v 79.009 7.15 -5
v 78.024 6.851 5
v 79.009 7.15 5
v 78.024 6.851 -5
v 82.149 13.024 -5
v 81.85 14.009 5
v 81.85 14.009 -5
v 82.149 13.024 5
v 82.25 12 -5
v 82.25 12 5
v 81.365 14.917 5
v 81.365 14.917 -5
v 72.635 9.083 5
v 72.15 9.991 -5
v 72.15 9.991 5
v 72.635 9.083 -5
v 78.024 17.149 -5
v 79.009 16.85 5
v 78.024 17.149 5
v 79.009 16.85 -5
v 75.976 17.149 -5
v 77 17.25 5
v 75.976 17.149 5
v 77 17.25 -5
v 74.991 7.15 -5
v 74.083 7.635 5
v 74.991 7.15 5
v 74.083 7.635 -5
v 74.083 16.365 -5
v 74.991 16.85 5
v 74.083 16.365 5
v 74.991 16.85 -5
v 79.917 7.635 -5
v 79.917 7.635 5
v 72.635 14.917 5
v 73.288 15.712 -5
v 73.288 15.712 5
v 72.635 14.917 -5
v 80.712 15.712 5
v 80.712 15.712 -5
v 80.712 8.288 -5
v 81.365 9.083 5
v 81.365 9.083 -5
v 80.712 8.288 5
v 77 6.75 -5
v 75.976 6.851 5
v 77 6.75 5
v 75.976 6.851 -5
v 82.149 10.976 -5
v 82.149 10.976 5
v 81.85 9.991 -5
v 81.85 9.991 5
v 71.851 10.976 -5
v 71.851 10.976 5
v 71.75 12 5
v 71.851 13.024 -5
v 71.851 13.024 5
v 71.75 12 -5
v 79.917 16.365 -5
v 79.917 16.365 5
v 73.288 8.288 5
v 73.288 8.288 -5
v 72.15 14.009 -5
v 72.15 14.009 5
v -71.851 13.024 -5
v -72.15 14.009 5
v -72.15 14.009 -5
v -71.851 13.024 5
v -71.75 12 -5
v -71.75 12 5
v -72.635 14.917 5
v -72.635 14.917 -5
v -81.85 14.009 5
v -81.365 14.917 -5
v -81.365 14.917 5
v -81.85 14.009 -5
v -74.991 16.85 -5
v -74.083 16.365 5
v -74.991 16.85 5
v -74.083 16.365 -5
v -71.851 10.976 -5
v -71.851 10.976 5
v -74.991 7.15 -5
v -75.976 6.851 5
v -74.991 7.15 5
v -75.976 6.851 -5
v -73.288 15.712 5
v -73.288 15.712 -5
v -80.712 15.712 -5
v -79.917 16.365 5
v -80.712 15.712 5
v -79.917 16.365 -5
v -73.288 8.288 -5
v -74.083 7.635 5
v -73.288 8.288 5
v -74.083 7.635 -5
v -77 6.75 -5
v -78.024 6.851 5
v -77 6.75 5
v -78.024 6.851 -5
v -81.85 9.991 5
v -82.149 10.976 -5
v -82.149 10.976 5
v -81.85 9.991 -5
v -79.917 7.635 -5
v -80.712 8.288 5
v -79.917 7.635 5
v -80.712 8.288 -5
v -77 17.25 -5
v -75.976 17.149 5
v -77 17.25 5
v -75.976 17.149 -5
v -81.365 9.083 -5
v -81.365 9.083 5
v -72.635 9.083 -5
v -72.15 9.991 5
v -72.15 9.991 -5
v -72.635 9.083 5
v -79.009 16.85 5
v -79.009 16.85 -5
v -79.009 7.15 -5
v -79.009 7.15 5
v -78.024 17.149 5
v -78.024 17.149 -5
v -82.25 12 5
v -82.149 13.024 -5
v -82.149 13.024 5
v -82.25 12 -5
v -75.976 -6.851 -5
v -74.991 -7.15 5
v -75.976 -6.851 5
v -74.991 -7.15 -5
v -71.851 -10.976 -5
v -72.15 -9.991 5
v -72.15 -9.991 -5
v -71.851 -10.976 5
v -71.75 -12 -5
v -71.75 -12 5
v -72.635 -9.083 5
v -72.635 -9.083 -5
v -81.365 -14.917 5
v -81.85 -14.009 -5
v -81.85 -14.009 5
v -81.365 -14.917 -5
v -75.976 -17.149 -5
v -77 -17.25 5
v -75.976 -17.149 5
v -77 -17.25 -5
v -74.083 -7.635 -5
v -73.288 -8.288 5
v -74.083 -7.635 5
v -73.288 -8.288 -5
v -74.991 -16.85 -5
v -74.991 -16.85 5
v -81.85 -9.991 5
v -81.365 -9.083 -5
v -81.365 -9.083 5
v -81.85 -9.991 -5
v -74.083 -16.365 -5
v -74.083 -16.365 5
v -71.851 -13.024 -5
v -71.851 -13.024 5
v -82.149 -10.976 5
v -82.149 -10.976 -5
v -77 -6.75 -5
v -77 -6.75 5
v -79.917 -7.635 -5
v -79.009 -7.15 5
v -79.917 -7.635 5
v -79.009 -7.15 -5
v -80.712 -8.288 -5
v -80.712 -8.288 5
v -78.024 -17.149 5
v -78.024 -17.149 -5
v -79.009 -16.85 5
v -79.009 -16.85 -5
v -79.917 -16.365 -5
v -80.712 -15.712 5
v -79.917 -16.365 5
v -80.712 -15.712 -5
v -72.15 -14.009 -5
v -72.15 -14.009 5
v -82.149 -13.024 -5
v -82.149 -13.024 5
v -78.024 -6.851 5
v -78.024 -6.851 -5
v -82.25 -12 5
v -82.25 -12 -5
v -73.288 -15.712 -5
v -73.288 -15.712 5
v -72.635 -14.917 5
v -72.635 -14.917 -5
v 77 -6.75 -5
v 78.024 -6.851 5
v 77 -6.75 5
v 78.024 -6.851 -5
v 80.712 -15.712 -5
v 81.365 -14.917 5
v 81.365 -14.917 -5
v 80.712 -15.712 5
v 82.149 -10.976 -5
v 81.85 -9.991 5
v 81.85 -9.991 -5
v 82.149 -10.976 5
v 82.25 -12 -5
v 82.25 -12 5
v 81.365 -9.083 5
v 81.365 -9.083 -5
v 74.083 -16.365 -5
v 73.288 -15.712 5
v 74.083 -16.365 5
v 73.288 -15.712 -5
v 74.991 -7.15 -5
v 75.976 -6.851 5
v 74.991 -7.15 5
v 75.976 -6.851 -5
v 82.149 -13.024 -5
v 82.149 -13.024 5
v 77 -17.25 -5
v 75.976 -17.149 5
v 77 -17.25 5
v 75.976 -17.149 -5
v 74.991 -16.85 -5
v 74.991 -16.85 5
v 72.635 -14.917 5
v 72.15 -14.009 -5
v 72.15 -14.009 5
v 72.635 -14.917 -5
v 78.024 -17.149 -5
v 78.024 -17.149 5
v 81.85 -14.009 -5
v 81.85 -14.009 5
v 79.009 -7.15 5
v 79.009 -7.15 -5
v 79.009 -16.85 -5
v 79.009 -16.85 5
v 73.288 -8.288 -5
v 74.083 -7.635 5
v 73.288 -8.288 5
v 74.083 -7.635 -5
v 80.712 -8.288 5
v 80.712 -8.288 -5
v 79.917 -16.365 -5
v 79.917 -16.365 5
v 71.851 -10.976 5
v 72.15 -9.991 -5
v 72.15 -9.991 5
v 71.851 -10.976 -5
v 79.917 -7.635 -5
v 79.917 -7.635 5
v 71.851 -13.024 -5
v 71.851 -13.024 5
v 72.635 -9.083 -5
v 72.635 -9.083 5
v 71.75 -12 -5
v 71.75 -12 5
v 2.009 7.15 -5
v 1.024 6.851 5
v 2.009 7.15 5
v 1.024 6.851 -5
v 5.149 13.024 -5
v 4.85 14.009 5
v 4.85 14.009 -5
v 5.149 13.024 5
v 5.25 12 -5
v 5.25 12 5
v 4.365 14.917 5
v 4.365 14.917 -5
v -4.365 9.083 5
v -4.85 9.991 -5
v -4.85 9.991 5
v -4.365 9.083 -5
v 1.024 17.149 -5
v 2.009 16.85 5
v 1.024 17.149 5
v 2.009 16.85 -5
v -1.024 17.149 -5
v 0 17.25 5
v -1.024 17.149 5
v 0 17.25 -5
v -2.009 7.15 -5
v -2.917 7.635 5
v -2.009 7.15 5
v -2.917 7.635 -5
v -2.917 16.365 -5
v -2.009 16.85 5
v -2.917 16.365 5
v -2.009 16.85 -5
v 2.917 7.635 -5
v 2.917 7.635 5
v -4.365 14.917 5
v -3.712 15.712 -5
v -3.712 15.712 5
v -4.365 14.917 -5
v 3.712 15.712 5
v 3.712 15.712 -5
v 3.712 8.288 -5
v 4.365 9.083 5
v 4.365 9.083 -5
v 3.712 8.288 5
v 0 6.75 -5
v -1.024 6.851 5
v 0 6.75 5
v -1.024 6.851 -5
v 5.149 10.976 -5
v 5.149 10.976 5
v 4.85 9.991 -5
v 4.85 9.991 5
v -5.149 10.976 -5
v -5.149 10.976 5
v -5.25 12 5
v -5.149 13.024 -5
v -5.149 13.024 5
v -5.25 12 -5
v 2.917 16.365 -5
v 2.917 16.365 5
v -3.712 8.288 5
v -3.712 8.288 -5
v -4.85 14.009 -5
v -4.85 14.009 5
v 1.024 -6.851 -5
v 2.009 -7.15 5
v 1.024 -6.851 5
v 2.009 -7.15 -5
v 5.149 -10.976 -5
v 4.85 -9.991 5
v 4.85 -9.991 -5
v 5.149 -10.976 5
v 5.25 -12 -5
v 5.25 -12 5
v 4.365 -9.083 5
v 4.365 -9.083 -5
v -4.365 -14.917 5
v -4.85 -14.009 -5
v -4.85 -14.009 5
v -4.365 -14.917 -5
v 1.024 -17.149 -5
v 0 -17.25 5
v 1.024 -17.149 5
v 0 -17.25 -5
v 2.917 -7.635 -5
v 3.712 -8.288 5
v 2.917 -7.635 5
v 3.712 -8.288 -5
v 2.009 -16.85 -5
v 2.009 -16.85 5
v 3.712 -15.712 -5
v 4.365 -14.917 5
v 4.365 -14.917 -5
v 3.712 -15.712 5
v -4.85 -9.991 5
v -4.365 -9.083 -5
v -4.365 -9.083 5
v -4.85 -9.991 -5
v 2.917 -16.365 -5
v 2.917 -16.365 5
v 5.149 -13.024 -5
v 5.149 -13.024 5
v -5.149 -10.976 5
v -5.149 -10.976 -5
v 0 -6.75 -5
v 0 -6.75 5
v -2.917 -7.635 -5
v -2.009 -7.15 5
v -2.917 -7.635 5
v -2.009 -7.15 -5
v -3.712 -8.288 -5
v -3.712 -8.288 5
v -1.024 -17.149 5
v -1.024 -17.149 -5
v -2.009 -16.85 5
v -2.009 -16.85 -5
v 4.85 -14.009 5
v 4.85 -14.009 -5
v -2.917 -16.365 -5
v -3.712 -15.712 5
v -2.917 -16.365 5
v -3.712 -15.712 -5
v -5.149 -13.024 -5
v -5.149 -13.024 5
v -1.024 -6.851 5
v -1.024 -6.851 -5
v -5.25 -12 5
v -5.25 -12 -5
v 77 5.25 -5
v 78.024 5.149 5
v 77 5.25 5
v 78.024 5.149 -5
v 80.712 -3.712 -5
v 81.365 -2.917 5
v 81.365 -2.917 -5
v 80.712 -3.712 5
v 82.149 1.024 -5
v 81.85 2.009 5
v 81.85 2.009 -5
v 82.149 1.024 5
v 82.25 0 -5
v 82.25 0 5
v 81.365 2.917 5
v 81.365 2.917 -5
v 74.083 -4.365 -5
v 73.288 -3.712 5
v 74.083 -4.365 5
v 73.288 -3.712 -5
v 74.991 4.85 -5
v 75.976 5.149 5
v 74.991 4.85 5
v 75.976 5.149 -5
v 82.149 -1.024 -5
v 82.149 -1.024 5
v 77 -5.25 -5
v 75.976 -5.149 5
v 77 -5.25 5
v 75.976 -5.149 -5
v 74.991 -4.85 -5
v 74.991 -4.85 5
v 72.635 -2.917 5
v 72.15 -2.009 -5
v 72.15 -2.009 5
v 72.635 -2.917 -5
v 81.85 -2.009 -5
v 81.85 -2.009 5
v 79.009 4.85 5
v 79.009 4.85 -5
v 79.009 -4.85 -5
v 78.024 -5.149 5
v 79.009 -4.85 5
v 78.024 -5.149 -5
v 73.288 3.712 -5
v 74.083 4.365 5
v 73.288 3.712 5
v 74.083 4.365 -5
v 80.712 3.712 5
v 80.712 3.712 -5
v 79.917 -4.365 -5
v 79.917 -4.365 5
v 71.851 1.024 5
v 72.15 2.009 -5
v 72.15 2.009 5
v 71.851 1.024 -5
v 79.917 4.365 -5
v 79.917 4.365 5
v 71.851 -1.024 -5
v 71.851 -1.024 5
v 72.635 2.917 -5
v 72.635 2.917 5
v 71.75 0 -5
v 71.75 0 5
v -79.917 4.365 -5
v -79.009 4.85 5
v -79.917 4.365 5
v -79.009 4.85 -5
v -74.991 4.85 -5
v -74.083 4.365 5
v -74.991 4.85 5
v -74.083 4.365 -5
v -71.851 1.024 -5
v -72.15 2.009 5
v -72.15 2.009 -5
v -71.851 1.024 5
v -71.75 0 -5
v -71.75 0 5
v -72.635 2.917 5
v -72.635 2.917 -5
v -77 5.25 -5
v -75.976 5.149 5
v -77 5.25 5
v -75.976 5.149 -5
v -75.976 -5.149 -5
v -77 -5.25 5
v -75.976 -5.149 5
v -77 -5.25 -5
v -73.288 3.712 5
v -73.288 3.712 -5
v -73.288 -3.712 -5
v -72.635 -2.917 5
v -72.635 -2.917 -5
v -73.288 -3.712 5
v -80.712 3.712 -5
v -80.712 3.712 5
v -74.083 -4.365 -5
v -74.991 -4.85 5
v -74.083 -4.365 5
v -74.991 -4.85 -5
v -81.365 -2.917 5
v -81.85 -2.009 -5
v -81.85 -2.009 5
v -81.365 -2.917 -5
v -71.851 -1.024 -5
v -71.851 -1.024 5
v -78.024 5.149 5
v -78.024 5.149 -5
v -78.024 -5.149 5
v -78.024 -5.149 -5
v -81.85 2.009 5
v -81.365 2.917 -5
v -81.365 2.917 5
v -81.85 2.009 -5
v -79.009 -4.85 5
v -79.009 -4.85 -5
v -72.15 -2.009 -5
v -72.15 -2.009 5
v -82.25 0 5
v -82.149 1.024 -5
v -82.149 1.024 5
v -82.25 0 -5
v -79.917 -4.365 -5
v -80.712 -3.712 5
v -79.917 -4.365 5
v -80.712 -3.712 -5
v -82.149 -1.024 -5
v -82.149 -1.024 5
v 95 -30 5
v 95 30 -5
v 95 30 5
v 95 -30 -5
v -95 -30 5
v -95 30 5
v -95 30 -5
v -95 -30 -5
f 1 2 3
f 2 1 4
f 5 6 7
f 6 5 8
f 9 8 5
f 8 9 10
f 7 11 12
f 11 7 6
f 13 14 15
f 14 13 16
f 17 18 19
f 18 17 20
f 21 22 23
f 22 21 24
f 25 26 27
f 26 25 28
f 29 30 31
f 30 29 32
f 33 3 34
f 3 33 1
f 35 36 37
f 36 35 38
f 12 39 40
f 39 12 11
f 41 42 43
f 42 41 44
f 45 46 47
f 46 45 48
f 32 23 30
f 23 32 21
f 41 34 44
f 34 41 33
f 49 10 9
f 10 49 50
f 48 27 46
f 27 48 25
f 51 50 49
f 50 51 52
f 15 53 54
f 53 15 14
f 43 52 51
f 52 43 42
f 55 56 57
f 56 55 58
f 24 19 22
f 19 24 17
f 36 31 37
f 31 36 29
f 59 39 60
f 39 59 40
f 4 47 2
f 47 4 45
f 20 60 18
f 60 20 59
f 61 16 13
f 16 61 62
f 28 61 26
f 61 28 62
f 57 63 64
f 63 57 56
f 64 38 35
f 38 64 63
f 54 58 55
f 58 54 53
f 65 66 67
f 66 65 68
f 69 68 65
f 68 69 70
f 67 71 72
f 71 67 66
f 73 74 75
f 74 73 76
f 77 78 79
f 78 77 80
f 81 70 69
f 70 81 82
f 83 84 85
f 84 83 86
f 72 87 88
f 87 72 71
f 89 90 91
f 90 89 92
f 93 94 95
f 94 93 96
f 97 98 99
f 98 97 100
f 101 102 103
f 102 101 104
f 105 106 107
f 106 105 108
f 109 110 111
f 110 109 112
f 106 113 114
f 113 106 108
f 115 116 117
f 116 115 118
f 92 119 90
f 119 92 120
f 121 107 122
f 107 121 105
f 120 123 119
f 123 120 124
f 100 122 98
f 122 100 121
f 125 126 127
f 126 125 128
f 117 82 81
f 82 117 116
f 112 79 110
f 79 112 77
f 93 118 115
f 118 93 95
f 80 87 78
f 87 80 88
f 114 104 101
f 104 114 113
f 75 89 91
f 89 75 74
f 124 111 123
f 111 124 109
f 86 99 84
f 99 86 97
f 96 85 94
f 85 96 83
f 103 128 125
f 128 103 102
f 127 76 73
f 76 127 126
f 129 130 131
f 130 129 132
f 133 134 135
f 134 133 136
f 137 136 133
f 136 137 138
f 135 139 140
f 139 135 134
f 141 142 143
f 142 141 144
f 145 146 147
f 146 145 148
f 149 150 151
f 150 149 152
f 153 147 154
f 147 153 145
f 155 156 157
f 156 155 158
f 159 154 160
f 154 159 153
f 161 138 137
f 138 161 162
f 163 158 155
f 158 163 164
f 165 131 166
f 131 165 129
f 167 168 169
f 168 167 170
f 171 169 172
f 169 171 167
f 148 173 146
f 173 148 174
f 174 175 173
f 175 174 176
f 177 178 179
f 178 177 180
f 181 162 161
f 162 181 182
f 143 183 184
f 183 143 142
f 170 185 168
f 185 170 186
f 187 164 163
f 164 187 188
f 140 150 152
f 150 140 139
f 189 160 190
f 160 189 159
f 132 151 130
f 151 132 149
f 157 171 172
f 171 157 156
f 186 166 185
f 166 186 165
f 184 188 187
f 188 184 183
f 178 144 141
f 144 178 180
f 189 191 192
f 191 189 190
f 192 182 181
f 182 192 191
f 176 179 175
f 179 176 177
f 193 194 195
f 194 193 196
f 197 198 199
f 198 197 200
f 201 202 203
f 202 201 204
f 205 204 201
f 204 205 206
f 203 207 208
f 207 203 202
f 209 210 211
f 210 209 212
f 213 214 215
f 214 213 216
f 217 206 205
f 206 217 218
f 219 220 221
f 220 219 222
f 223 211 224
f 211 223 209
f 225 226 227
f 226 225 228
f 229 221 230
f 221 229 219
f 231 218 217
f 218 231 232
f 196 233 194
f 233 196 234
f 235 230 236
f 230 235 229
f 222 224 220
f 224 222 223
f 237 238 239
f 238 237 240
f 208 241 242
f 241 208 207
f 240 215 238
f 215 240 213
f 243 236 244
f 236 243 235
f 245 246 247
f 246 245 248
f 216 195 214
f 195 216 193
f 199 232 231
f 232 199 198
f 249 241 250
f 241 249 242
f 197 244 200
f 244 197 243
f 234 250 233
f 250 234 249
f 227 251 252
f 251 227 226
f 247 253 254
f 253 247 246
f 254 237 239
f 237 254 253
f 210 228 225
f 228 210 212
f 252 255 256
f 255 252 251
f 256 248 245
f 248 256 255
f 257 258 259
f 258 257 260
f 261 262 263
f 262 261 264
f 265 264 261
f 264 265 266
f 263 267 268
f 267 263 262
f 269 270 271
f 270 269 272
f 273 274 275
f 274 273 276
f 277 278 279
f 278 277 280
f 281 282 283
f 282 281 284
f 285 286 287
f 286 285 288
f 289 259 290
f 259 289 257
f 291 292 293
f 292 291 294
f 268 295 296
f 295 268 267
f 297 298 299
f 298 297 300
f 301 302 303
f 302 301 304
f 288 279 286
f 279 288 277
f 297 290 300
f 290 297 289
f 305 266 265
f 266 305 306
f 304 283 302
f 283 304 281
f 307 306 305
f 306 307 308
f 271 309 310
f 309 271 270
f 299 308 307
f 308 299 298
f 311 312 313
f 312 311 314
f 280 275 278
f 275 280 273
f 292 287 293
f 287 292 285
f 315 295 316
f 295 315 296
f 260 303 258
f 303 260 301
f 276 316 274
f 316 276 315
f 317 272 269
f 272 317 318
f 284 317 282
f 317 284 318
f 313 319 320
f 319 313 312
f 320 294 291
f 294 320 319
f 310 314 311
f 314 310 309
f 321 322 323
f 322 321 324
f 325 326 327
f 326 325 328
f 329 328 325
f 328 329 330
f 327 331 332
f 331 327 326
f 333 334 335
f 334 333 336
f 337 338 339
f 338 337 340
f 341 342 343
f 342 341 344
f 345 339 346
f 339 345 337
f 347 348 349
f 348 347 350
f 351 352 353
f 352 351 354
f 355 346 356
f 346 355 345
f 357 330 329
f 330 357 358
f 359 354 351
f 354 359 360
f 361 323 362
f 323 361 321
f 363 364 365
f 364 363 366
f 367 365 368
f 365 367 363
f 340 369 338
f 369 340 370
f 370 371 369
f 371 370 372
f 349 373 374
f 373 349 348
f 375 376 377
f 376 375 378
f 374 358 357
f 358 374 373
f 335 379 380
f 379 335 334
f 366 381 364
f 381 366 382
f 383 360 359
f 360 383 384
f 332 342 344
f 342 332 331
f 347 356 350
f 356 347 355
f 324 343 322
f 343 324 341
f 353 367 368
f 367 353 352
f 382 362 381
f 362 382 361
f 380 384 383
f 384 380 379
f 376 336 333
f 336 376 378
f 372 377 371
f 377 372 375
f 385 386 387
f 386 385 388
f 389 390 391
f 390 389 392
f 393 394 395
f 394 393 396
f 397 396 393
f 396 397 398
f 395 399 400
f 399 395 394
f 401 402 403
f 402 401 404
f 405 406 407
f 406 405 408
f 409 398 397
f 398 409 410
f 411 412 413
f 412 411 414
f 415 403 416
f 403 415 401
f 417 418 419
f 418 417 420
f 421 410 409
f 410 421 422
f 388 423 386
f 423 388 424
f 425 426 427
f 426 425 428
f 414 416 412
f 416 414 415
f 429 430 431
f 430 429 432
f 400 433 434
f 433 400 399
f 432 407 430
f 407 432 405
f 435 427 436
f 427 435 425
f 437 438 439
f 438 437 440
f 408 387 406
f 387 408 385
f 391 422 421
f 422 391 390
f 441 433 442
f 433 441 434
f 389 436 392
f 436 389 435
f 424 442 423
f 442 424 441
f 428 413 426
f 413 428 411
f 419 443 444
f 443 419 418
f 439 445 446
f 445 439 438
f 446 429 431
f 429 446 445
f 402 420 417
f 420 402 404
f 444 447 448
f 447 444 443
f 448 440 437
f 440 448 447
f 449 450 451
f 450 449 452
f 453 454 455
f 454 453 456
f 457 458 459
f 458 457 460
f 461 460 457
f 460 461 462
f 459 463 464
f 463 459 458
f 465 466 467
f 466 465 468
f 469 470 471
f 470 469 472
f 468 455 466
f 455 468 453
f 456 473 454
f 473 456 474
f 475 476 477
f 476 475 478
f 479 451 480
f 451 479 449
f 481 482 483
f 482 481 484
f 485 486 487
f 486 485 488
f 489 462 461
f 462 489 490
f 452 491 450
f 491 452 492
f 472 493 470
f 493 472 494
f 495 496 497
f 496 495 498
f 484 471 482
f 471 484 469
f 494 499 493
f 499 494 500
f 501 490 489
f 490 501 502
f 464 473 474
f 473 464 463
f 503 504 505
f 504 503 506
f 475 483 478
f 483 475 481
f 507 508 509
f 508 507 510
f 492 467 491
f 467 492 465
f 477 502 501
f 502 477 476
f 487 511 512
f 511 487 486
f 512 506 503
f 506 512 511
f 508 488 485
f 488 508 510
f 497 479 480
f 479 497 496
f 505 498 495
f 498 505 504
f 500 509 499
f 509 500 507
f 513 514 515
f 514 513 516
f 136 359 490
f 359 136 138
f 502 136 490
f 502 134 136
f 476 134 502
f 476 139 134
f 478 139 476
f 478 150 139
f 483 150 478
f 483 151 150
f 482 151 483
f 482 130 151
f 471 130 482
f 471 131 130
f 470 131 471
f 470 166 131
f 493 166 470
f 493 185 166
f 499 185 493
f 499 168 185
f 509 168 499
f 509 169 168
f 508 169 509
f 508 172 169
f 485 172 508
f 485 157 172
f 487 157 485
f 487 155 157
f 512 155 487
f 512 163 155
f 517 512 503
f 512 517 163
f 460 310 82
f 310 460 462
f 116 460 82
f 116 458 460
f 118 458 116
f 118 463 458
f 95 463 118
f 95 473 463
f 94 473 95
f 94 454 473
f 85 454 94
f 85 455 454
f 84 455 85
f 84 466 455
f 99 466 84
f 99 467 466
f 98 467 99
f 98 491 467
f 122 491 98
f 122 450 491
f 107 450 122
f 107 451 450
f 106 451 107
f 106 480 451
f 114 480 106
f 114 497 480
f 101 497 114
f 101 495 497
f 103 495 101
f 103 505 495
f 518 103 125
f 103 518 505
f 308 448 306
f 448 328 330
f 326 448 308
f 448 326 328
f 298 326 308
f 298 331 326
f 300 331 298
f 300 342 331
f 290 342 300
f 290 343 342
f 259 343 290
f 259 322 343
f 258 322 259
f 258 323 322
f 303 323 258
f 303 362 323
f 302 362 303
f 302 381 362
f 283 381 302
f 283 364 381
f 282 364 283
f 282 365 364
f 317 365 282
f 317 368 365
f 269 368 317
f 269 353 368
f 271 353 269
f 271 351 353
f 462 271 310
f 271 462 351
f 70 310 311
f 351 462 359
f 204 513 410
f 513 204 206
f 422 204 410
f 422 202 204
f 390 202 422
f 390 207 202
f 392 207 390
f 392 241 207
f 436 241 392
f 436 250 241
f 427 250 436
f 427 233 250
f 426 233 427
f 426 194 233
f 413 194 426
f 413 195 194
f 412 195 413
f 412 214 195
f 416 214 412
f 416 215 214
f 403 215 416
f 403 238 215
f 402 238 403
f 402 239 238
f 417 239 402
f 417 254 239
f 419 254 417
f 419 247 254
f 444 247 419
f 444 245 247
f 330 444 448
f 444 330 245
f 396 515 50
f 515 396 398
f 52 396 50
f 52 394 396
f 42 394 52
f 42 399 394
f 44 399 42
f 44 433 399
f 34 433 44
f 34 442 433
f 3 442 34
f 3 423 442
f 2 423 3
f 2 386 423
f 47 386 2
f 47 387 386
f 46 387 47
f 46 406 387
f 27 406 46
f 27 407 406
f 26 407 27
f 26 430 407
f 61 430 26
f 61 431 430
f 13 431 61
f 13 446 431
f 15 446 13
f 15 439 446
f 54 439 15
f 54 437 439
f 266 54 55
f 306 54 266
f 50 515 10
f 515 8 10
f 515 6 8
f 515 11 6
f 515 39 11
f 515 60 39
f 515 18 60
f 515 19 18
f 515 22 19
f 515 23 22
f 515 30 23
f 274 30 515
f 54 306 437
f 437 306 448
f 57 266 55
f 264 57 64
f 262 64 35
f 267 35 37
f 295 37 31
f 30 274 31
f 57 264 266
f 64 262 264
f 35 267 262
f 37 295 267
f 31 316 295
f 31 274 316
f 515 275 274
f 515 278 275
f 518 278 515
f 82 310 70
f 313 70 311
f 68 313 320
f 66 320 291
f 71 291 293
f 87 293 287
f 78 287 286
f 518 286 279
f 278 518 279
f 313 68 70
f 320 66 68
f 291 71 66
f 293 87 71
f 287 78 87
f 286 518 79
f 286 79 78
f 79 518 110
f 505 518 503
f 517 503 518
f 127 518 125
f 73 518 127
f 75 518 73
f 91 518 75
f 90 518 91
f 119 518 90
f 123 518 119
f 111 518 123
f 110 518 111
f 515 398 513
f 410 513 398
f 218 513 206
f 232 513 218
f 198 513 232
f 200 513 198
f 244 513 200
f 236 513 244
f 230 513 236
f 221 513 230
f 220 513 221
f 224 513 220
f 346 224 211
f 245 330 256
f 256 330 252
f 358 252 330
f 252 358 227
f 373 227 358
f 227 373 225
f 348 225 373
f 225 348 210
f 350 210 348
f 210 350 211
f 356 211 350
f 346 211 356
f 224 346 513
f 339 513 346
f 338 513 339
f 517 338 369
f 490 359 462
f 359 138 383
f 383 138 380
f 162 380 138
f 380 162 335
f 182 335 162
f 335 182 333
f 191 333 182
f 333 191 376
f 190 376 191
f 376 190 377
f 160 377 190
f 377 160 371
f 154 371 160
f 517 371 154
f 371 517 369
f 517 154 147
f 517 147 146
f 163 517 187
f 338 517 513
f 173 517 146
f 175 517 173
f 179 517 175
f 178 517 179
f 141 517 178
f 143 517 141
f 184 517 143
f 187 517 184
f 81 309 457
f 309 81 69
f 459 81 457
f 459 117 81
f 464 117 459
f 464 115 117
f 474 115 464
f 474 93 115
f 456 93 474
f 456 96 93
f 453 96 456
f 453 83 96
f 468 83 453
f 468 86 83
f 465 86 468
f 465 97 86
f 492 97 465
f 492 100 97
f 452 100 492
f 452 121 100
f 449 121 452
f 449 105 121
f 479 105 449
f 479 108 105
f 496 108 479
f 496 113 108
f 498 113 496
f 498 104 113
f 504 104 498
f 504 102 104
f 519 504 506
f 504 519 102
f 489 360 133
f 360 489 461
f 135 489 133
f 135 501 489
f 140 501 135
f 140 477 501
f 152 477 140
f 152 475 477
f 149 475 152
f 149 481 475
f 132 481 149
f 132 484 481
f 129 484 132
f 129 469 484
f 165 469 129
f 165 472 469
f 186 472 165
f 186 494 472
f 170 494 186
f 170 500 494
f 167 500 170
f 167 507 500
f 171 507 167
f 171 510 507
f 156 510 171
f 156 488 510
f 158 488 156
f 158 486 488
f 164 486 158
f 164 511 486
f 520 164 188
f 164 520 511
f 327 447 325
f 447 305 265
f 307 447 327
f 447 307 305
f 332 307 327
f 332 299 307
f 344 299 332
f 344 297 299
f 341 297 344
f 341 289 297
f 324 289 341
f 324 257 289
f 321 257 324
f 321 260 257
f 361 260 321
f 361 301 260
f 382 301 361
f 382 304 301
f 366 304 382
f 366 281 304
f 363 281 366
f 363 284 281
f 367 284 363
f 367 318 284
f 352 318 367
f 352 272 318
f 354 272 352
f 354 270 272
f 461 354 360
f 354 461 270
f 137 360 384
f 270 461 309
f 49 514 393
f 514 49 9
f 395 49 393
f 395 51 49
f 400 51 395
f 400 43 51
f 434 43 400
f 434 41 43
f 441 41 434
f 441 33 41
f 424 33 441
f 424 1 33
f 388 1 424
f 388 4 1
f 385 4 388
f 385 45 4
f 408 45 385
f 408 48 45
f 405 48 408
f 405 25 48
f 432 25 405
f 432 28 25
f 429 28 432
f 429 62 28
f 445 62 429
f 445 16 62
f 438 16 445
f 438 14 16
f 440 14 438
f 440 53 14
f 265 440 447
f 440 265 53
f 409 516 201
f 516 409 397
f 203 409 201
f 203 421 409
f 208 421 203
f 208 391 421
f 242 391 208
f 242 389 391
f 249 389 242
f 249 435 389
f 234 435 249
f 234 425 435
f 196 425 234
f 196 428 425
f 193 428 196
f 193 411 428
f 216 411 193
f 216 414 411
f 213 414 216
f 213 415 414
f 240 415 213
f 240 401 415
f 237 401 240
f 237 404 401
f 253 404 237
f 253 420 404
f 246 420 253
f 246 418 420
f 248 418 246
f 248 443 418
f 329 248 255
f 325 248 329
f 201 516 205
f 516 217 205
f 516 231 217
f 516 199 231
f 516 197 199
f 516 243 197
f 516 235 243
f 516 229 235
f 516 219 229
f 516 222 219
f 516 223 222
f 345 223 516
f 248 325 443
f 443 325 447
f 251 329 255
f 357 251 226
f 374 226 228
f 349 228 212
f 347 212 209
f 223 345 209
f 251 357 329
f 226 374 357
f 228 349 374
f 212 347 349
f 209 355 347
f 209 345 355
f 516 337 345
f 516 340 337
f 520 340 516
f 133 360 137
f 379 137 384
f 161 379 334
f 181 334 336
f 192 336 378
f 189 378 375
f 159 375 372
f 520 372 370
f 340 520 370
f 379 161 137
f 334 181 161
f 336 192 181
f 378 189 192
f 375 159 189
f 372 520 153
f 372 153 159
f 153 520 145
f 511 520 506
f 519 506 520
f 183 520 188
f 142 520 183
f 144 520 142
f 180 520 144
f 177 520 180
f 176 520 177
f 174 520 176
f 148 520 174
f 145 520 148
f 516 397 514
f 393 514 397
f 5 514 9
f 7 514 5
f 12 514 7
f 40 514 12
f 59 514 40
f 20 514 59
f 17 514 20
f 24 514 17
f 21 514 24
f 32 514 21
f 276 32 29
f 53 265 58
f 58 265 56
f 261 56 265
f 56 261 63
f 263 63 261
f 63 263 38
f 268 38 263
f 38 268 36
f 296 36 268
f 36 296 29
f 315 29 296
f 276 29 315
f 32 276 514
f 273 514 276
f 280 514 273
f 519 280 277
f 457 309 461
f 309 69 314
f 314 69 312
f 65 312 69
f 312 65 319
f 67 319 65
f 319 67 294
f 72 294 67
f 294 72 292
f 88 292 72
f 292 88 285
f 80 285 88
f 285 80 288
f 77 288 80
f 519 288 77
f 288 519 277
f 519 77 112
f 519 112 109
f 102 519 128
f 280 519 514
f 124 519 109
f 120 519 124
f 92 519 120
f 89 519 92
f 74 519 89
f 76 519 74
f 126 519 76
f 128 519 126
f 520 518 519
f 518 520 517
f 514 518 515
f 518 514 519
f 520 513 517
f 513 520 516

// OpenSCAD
$fn = 32;

// ----------------------------------------------------------------------
// Corner plate 190 x 60 x 10
// 8 holes, centres taken from the edge offset
// ----------------------------------------------------------------------

// --- parameters (mm) ---
plate = [190, 60, 10];  // overall size (x, y, z)
holes = 8;              // number of holes the drawing asks for
hole_d = 10.5;          // hole diameter
edge = 18;              // hole centre offset from the plate edge

// --- derived feature positions (mm) ---
corner_x = plate[0] / 2 - edge;  // = 77   corner hole X
corner_y = plate[1] / 2 - edge;  // = 12   corner hole Y
feature_centers = [
  [corner_x, corner_y],
  [-corner_x, corner_y],
  [-corner_x, -corner_y],
  [corner_x, -corner_y],
  [0, corner_y],
  [0, -corner_y],
  [corner_x, 0],
  [-corner_x, 0]
];   // hole centres the loop below drills

// plate outline, every hole drilled through with the same cutters
difference() {
  cube(plate, center = true);
  for (centre = feature_centers)
    translate([centre[0], centre[1], 0])
      cylinder(d = hole_d, h = plate[2] + 2, center = true);
}
